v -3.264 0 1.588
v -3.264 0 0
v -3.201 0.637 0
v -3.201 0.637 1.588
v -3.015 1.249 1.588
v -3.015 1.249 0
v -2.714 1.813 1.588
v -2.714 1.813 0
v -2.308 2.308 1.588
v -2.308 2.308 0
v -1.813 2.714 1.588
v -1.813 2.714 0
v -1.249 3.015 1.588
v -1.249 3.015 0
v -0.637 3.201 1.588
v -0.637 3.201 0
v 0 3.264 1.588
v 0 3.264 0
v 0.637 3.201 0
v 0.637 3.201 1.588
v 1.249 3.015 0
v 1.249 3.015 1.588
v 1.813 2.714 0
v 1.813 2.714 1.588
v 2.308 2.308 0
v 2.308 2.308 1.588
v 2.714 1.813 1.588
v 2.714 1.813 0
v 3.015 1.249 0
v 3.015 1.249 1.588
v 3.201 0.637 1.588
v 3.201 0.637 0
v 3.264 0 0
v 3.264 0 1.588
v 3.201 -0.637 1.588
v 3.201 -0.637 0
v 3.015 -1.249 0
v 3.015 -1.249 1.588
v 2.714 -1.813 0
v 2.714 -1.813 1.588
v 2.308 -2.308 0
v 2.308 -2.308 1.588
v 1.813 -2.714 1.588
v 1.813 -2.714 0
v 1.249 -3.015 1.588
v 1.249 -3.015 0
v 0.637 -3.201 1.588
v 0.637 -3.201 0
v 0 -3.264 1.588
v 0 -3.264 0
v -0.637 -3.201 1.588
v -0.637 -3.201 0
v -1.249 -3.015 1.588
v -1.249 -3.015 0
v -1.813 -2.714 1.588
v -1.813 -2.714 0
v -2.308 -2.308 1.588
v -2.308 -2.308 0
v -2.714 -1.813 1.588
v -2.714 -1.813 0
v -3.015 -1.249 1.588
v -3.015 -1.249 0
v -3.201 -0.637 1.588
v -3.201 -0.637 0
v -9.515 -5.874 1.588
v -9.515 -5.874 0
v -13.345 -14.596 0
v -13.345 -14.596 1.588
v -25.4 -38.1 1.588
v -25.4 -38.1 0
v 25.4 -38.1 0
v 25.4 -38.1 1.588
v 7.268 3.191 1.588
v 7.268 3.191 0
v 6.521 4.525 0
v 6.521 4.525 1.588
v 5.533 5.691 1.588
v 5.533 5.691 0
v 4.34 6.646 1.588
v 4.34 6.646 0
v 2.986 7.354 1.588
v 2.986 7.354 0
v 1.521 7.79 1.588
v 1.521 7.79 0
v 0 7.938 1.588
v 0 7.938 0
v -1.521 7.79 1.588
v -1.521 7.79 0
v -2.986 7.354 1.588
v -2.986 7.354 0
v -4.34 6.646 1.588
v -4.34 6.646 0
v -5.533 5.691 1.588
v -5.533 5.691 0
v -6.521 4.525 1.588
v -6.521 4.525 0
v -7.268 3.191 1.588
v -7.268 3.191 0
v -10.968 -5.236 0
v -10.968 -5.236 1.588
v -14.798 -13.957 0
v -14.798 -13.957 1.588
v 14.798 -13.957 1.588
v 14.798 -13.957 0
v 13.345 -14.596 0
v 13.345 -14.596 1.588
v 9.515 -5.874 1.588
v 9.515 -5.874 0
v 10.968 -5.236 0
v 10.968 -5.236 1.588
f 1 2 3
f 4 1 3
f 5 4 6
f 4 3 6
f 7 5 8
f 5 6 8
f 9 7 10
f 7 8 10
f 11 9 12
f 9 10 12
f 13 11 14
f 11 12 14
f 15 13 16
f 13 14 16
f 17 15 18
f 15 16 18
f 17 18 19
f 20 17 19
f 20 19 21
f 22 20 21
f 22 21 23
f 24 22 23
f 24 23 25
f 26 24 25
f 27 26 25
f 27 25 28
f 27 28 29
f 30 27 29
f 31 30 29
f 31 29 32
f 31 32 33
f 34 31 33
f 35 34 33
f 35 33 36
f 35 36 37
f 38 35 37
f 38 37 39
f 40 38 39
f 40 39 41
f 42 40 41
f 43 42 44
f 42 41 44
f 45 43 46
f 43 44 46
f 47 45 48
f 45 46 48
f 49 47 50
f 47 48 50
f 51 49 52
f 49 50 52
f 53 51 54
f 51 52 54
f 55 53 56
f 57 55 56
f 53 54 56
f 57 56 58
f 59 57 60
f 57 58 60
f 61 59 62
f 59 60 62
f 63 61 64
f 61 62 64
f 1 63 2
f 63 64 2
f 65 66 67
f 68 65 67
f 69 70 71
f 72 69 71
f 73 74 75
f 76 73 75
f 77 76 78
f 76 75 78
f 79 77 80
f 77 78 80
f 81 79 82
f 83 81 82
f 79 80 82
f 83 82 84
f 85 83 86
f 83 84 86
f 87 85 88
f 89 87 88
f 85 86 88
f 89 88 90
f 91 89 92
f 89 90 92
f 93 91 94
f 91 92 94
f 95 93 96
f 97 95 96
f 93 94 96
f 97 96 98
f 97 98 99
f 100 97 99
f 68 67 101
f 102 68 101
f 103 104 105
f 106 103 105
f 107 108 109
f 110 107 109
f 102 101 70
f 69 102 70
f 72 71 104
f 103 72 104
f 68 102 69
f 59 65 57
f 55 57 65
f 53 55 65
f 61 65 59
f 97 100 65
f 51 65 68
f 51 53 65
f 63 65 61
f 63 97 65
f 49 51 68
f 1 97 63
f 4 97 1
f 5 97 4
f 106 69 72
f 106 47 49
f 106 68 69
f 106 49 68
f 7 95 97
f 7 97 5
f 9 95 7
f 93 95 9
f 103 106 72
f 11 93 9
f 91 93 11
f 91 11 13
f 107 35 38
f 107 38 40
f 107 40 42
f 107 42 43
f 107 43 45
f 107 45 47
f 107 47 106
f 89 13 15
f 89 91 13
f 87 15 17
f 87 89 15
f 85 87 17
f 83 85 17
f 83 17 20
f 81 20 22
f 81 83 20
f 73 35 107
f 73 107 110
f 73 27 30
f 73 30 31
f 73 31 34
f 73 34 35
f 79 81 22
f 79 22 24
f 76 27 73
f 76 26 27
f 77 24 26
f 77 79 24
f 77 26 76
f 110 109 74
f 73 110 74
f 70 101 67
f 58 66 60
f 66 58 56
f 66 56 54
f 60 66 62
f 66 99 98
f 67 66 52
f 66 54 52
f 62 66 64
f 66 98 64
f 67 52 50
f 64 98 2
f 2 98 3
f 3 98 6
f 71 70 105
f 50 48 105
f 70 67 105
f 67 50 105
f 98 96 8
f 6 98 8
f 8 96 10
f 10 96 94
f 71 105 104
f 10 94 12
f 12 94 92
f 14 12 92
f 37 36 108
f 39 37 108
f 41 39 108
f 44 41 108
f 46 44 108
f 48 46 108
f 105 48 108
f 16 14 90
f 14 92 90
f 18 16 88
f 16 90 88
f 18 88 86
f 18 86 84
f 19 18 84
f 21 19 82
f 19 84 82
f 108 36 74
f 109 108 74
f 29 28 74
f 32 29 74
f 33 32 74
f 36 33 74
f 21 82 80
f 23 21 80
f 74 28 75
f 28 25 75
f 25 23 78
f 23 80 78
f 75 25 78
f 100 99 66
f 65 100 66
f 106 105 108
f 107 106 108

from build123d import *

# Parameters (mm, degrees)
BOSS_EXTRUDE1_DEPTH     = 1.5875
F_1_4_CLEARANCE_HOLE1_D = 6.5278


with BuildPart() as part:
    # Sketch1 → Boss-Extrude1 (new body)
    with BuildSketch(Plane.XY):
        with BuildLine():
            ThreePointArc((7.267638826, 3.191446717), (0, 7.9375), (-7.267638826, 3.191446717))
            Line((-7.267638826, 3.191446717), (-10.968425472, -5.236073182))
            Line((-10.968425472, -5.236073182), (-9.514897707, -5.874362525))
            Line((-9.514897707, -5.874362525), (-13.344633767, -14.595529116))
            Line((-13.344633767, -14.595529116), (-14.798161533, -13.957239773))
            Line((-14.798161533, -13.957239773), (-25.4, -38.1))
            Line((-25.4, -38.1), (25.4, -38.1))
            Line((25.4, -38.1), (14.798161533, -13.957239773))
            Line((14.798161533, -13.957239773), (13.344633767, -14.595529116))
            Line((13.344633767, -14.595529116), (9.514897707, -5.874362525))
            Line((9.514897707, -5.874362525), (10.968425472, -5.236073182))
            Line((10.968425472, -5.236073182), (7.267638826, 3.191446717))
        make_face()
    extrude(amount=BOSS_EXTRUDE1_DEPTH)

    # 1/4 Clearance Hole1 (through all)
    with Locations(Plane.XY.offset(1.5875)):
        with Locations((0, 0)):
            Hole(F_1_4_CLEARANCE_HOLE1_D / 2)


solid = part.part
